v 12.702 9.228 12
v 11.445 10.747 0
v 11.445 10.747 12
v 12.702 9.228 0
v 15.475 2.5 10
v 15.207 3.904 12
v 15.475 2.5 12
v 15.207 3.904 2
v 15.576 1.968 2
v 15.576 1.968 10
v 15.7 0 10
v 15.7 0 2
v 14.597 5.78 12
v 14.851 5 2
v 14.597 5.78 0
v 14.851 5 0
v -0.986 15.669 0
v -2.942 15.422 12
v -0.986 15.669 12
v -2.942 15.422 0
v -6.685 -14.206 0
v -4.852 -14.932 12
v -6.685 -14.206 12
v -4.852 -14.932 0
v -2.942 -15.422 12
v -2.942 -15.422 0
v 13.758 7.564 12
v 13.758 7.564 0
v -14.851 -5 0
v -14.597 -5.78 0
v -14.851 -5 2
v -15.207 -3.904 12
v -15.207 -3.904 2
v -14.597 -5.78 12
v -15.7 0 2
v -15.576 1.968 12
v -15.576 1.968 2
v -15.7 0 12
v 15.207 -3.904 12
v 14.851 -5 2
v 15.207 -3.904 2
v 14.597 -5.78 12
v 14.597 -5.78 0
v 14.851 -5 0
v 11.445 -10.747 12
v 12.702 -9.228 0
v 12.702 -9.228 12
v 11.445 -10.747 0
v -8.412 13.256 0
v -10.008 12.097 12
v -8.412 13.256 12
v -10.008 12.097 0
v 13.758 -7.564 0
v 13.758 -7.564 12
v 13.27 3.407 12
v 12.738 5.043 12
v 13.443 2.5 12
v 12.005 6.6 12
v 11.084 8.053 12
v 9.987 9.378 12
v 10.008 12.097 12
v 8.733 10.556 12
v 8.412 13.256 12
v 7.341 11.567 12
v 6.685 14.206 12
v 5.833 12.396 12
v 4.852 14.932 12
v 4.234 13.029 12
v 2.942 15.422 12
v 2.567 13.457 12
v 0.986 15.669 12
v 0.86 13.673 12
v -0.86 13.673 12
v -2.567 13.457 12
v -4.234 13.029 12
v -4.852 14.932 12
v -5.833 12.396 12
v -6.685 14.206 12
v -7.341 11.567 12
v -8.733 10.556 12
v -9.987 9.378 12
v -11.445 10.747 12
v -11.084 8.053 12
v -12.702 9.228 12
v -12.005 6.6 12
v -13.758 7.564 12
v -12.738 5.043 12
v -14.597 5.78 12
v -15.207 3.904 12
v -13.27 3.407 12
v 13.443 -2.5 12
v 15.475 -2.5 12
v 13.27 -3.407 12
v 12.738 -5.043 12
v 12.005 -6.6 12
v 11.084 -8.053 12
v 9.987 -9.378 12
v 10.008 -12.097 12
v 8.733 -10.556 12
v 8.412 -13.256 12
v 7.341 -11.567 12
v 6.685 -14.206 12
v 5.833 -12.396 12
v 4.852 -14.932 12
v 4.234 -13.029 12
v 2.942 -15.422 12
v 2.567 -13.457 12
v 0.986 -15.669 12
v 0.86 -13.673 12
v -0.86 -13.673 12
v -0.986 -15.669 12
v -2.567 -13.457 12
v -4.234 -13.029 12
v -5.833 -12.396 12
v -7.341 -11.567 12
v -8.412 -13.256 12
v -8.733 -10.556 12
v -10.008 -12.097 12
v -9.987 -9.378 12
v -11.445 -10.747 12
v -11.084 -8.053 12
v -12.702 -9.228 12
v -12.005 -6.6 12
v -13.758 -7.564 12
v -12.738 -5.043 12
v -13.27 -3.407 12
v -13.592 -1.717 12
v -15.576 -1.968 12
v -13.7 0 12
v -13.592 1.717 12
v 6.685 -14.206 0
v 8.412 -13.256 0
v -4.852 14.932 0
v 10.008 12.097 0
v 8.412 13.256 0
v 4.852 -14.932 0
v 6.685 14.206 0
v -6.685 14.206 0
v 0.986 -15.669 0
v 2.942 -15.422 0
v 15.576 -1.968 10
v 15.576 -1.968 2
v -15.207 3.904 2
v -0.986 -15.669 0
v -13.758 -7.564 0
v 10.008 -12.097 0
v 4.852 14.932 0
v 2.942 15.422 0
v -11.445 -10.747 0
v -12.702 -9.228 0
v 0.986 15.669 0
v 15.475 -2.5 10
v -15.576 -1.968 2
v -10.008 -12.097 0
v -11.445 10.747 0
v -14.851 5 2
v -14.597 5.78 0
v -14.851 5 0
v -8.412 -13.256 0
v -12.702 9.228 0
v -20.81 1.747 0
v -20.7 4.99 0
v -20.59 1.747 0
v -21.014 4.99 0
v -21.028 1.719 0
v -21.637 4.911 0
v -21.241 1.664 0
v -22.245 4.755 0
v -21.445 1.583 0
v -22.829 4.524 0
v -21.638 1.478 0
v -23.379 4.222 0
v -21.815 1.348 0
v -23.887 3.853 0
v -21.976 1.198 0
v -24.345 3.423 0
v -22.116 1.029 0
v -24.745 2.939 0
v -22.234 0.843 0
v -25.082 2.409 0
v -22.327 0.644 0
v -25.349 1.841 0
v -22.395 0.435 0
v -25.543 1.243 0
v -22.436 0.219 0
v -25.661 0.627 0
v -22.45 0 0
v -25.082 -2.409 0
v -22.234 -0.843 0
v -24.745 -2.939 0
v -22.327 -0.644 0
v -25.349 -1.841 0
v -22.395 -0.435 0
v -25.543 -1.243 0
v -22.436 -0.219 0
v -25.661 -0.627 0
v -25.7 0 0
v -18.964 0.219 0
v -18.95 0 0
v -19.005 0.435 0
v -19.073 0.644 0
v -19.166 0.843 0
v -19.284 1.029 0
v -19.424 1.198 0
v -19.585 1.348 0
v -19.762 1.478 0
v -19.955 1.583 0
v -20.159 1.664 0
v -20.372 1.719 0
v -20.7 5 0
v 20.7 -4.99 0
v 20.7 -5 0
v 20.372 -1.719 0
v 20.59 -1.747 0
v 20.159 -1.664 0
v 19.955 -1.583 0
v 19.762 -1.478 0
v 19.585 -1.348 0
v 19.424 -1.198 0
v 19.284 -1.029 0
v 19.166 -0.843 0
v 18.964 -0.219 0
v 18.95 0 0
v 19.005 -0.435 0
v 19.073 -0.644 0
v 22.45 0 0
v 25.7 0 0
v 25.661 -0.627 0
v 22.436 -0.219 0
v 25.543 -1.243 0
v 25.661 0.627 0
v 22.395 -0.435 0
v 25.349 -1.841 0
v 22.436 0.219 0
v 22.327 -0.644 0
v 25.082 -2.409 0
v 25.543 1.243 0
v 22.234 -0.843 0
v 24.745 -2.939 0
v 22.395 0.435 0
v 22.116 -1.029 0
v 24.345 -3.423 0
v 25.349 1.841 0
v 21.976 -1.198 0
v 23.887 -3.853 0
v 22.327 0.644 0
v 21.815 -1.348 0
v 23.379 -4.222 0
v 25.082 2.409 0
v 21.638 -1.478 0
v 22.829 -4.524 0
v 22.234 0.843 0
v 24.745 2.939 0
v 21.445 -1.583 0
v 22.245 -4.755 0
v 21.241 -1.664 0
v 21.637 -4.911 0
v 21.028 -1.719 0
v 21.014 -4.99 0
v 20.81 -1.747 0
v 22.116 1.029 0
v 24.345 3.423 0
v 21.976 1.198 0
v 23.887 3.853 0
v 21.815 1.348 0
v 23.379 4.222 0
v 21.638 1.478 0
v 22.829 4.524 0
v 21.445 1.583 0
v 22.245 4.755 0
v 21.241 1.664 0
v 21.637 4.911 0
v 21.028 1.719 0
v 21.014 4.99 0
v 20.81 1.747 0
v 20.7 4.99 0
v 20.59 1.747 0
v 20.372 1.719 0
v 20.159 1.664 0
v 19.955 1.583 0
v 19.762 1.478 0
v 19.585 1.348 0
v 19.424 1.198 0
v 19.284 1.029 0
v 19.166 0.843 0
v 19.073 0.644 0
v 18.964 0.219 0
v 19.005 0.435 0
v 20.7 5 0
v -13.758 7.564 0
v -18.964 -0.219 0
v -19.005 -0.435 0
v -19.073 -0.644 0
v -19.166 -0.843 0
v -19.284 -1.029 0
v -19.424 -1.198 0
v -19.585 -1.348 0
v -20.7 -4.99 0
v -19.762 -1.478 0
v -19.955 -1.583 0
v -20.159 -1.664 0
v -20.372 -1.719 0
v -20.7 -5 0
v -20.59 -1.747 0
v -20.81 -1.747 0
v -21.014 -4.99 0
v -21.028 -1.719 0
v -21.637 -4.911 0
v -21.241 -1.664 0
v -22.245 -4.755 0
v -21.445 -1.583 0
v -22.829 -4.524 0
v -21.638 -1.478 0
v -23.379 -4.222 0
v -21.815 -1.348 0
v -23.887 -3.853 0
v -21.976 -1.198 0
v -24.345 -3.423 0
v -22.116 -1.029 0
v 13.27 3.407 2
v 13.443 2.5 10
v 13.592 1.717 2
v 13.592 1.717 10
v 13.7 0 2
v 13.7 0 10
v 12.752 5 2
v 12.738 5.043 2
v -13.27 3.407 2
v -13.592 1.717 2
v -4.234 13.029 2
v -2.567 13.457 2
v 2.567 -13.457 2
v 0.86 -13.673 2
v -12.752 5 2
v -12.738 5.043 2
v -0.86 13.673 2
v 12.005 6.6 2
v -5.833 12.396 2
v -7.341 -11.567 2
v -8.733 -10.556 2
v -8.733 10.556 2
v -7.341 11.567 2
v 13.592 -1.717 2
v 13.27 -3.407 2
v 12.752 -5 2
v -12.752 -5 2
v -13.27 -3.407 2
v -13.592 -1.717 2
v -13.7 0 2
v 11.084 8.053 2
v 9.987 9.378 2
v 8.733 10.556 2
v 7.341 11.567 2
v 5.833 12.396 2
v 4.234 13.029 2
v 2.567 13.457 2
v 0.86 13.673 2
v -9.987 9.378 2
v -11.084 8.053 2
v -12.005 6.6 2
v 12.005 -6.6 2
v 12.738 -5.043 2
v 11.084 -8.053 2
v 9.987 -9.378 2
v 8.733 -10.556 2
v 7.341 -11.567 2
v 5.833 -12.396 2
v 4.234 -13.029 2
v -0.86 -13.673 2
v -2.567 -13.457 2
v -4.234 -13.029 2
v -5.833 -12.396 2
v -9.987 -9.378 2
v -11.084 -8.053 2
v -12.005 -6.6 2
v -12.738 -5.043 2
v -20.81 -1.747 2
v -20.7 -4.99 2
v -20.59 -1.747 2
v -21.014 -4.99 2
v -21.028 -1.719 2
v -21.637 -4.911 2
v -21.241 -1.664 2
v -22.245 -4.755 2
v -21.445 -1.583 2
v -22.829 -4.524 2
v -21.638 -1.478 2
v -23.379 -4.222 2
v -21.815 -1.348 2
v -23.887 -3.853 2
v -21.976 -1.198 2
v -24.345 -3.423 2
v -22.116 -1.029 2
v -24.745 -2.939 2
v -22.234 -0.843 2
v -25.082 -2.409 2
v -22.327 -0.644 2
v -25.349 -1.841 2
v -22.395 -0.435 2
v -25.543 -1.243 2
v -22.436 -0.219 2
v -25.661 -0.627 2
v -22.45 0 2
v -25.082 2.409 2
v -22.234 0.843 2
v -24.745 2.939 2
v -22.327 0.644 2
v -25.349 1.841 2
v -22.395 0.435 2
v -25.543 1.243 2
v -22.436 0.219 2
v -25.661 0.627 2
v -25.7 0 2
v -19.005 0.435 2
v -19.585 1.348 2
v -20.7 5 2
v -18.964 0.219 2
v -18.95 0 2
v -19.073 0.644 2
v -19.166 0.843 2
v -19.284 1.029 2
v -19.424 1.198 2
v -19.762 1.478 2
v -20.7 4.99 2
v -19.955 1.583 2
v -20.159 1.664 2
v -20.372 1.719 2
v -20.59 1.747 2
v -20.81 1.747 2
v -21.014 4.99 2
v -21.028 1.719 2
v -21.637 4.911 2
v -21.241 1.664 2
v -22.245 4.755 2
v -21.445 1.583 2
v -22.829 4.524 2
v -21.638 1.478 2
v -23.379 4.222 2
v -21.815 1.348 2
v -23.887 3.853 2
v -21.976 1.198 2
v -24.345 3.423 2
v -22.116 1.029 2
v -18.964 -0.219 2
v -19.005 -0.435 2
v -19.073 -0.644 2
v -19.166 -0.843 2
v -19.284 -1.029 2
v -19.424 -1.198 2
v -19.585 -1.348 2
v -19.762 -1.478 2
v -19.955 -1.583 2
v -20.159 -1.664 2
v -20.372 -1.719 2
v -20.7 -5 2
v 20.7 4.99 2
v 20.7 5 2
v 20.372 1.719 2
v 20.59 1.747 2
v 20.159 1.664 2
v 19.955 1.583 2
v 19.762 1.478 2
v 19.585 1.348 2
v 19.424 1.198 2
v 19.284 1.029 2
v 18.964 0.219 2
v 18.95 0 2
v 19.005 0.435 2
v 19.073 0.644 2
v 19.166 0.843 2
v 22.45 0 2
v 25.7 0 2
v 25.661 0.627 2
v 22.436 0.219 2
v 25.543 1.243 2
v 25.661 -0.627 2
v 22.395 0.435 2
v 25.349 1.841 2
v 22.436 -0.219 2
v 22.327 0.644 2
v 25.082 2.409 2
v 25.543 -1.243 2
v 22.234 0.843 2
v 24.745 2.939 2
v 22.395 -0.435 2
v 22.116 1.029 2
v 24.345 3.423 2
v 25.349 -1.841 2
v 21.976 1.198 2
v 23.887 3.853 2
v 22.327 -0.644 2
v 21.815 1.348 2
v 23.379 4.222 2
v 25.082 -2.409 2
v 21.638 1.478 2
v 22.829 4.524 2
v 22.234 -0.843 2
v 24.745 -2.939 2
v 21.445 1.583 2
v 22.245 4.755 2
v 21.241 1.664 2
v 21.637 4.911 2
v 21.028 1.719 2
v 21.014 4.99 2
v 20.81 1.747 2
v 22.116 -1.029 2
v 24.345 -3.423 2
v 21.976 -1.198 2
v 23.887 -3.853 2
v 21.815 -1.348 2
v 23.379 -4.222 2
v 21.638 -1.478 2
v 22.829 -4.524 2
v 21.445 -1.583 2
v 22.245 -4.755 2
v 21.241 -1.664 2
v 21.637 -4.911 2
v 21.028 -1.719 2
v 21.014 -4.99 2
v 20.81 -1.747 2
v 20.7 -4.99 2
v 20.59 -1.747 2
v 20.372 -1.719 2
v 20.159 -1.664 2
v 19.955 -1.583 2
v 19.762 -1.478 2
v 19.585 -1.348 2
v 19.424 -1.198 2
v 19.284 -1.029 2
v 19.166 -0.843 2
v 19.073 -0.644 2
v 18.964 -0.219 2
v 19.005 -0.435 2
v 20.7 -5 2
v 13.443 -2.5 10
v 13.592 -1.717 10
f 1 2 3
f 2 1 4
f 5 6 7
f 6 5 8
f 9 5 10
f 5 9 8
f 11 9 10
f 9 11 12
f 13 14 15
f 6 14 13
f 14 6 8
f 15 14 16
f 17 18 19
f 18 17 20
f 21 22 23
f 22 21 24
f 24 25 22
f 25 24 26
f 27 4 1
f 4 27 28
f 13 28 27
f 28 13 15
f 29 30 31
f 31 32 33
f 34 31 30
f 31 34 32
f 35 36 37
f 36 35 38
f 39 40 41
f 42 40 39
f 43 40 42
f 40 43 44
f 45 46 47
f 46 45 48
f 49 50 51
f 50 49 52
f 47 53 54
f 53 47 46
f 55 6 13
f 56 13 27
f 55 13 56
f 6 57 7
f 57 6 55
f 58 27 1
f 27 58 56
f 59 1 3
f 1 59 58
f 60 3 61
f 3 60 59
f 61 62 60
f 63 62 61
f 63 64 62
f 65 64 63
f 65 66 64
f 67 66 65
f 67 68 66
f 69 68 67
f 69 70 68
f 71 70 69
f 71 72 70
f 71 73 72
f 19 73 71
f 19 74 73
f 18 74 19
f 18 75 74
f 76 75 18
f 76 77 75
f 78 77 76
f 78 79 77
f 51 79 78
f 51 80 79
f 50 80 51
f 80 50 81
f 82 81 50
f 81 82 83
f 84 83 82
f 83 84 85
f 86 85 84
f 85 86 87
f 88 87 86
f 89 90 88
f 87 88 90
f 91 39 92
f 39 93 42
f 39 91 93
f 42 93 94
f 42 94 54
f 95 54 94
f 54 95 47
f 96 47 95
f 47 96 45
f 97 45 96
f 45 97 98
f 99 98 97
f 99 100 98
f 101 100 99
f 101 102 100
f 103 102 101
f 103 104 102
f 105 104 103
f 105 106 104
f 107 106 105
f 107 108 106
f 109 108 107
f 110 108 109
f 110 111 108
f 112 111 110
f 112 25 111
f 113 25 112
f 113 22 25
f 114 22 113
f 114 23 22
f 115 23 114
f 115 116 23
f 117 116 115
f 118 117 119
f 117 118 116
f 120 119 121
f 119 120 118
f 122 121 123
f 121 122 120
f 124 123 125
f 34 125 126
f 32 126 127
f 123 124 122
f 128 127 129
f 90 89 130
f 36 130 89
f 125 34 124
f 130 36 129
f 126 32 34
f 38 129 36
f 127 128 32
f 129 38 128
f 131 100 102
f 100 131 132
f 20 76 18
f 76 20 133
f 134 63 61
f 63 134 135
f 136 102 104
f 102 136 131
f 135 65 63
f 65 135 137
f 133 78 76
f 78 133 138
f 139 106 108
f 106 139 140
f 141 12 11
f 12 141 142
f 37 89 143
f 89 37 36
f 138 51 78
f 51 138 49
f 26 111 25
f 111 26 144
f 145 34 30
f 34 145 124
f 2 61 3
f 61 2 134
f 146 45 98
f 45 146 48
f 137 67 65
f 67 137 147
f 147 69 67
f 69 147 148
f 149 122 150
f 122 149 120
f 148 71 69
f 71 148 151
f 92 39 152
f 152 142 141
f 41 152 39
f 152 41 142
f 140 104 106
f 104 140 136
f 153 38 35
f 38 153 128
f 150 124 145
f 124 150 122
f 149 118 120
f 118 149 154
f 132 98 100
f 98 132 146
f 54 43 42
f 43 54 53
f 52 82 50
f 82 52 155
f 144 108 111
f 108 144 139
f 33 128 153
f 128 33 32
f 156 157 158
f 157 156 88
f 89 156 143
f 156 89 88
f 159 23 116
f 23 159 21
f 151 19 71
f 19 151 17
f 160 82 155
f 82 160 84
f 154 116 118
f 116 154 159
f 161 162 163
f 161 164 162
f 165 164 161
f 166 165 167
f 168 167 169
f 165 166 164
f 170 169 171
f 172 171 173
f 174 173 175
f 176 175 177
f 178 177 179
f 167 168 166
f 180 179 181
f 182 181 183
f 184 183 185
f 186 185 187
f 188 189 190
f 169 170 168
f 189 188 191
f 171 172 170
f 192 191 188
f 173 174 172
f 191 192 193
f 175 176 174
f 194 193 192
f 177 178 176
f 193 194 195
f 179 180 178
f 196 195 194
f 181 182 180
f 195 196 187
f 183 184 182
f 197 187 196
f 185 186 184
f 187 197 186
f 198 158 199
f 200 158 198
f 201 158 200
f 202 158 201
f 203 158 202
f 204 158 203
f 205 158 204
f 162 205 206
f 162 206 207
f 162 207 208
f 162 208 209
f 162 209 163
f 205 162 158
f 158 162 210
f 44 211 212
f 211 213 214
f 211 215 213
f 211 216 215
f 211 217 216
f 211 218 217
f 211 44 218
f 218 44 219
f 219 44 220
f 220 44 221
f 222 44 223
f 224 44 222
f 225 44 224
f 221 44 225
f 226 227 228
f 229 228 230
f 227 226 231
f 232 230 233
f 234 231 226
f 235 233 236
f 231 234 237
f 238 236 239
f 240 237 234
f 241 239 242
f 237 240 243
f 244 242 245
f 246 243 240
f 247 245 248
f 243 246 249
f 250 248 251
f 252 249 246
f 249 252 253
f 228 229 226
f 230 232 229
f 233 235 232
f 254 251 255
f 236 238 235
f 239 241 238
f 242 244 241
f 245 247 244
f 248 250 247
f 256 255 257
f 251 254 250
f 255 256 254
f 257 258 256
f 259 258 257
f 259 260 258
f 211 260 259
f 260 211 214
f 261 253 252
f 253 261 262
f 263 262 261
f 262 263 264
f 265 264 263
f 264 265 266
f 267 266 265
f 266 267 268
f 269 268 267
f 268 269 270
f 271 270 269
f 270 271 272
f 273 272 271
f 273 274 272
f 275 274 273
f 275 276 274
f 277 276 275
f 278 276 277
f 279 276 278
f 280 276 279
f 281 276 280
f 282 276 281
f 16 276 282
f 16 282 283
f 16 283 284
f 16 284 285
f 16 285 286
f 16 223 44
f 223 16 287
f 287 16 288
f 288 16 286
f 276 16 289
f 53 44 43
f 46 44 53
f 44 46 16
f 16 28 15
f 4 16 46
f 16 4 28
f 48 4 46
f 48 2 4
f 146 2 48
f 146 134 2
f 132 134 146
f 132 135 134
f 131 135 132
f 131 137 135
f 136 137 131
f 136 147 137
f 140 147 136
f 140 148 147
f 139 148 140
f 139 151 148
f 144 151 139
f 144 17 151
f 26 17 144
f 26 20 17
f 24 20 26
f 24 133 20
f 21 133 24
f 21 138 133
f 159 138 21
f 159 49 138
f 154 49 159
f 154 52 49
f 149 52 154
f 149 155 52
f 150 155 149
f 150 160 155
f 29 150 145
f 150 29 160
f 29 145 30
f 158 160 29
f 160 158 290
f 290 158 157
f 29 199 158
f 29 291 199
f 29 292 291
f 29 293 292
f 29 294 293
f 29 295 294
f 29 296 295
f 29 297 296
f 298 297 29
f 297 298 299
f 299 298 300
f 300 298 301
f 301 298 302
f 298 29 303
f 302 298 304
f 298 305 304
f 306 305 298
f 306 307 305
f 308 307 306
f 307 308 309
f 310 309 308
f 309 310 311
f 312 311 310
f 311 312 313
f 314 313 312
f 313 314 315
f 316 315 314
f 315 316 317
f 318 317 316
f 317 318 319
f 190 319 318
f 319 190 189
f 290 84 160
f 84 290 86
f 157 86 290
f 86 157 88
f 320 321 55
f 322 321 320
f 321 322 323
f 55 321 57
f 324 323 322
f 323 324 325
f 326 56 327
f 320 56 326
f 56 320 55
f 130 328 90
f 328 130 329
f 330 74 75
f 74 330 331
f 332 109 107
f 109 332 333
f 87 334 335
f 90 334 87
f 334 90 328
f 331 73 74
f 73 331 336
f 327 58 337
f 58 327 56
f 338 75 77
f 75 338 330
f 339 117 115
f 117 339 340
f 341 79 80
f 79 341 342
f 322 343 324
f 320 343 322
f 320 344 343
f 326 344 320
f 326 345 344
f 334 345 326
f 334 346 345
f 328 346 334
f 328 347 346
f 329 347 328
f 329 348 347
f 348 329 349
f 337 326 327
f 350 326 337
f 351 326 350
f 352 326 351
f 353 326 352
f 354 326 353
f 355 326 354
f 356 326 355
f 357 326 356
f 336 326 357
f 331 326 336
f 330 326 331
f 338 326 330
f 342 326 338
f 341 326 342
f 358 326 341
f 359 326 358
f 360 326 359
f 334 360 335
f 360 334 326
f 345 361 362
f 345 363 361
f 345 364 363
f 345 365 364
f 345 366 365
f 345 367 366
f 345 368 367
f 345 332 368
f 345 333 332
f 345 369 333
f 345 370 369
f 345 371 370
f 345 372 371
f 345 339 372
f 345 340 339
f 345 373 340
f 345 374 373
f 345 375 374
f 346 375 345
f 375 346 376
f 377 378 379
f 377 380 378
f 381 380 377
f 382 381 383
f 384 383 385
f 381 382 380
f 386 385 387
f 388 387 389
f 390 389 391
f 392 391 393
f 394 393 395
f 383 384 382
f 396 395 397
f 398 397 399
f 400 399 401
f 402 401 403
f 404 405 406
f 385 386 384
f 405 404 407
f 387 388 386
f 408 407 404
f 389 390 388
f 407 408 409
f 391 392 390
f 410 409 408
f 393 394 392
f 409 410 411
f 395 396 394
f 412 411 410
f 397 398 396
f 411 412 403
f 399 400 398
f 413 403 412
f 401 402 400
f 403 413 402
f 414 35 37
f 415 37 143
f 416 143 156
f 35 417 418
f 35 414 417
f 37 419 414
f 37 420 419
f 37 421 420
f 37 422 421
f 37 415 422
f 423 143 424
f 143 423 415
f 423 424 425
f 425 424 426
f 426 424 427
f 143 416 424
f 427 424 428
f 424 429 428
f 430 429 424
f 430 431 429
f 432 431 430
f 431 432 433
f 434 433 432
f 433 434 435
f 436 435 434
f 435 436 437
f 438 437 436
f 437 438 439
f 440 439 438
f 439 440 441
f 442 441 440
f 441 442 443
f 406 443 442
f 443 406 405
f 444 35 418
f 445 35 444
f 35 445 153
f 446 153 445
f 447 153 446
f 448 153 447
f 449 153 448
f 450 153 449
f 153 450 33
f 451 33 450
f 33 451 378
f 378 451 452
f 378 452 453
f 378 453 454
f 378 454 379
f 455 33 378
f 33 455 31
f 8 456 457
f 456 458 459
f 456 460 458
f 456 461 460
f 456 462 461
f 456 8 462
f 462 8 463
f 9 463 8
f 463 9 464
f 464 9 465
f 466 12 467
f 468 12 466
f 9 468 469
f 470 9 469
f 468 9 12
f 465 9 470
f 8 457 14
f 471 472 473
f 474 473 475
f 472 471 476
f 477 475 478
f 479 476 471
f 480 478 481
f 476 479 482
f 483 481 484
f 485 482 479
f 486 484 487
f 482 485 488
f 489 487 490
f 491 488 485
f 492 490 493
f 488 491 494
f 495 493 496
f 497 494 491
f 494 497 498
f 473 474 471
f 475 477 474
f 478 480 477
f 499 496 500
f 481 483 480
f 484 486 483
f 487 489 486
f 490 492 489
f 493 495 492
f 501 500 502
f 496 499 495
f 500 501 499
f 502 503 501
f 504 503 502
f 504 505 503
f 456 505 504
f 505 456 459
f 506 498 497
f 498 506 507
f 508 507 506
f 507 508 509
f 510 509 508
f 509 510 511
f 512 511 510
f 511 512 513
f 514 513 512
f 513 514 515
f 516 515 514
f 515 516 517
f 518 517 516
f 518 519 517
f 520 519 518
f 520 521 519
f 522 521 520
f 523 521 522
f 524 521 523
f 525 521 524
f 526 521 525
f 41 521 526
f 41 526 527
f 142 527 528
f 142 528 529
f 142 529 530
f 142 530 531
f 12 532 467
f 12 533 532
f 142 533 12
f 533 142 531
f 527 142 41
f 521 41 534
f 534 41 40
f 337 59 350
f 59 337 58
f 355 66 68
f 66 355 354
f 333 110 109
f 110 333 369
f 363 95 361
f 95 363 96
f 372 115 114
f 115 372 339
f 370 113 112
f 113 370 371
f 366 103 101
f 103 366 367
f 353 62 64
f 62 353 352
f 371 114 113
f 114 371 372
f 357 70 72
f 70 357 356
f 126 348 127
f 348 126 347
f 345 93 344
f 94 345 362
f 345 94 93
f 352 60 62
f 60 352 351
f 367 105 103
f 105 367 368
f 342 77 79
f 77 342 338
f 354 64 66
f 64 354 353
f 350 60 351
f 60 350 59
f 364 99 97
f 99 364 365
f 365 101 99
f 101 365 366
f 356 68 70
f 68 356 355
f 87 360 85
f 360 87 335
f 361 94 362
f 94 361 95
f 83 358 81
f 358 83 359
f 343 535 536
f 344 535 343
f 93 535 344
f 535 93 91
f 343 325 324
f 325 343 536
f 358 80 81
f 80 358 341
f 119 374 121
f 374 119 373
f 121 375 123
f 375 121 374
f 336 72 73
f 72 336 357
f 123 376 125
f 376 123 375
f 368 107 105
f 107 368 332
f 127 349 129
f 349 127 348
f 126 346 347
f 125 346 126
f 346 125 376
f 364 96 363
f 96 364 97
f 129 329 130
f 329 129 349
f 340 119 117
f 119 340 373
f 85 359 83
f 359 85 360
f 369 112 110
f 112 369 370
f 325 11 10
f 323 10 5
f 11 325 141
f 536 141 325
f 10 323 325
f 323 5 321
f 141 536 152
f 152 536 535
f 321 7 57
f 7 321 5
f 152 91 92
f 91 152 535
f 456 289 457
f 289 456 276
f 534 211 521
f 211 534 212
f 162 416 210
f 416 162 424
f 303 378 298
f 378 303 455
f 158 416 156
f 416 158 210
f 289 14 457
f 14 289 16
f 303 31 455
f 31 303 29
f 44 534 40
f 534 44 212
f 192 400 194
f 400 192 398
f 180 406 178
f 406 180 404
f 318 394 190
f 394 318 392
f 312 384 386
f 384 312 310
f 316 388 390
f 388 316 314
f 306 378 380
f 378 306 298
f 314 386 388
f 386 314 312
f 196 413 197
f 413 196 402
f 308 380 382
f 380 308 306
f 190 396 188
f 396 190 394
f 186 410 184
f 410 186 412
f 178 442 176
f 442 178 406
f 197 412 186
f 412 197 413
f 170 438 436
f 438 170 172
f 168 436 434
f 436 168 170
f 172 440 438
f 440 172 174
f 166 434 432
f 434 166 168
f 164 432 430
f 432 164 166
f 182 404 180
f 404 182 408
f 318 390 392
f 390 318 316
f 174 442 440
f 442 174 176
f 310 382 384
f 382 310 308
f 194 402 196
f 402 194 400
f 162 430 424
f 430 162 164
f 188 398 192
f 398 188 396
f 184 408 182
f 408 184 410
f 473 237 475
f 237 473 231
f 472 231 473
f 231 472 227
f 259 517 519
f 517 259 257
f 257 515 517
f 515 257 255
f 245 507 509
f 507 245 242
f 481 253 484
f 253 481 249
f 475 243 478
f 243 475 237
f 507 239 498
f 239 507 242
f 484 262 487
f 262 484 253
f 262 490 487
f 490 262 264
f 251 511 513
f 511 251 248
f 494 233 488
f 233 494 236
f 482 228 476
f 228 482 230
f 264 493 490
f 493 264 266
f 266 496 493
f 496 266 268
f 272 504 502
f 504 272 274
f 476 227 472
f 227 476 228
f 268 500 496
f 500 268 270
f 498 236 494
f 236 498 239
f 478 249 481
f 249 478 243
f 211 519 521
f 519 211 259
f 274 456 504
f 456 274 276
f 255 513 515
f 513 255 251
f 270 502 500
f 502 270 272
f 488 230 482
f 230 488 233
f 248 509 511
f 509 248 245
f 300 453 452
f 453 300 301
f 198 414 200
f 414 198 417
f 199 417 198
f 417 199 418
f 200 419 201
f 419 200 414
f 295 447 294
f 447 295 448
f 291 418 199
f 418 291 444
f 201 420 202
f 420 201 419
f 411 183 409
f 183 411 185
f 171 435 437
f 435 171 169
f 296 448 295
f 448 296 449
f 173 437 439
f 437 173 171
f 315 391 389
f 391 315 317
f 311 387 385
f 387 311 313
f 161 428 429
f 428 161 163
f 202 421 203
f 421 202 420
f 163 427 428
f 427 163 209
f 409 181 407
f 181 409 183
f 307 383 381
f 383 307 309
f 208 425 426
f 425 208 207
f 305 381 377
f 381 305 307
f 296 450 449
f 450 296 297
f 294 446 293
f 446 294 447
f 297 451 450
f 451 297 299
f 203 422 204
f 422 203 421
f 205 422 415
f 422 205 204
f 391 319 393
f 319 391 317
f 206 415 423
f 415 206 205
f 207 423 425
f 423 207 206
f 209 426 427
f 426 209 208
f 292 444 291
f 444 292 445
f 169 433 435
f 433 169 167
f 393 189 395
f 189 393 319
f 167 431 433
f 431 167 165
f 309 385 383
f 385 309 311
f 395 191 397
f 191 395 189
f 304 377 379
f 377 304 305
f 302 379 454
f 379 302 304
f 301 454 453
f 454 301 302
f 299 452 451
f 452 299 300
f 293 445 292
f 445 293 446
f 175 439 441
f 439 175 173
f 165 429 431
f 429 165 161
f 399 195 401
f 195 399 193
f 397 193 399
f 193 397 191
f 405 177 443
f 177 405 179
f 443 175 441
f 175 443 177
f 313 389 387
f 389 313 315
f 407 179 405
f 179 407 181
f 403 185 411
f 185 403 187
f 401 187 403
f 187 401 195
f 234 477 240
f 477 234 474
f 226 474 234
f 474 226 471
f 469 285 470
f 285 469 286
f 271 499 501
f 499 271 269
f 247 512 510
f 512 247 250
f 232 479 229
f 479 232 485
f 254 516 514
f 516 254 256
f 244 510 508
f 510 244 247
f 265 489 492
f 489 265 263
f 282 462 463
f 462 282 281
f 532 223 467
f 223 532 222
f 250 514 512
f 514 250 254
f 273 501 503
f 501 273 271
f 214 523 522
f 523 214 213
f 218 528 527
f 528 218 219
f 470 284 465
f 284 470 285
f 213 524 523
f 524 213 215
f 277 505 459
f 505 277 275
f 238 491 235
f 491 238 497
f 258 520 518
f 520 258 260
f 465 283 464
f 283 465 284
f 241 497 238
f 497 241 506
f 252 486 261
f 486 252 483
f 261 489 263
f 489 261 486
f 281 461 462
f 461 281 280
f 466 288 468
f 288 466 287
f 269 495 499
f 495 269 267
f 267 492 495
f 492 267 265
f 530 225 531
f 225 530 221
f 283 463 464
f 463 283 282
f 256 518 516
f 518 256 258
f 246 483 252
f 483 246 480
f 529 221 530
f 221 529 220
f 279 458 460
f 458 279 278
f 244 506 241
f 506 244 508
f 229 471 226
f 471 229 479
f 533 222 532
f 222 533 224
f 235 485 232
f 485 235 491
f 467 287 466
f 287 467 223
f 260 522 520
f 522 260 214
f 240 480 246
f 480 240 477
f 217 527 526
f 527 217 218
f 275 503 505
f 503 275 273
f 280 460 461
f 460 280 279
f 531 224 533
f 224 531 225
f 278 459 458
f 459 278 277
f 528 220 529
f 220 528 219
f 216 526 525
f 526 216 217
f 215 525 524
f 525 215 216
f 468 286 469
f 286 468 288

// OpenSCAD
$fn = 50;

wall = 2;
ext_d = 31.4;
h = 12;
wire_hole_sz_y = 5;

//union() {
difference() {
	cylinder(d=ext_d, h=h);
	translate([0, 0, wall]) {
		cylinder(d=ext_d-2*wall, h=h-wall);
	}
	translate([ext_d/4, -wire_hole_sz_y/2, h-wall]) {
		cube([ext_d/2, wire_hole_sz_y, wall]);
	}
}
translate([-(ext_d+10)/2, -5, 0]) {
	difference() {
		union() {
			cube([ext_d+10, 10, wall]);
			translate([0, 5, 0]) {
				cylinder(d=10, h=wall);
			}
			translate([ext_d+10, 5, 0]) {
				cylinder(d=10, h=wall);
			}
		}
		translate([0, 5, 0]) {
			cylinder(d=3.5, h=wall);
		}
		translate([ext_d+10, 5, 0]) {
			cylinder(d=3.5, h=wall);
		}
	}
}
